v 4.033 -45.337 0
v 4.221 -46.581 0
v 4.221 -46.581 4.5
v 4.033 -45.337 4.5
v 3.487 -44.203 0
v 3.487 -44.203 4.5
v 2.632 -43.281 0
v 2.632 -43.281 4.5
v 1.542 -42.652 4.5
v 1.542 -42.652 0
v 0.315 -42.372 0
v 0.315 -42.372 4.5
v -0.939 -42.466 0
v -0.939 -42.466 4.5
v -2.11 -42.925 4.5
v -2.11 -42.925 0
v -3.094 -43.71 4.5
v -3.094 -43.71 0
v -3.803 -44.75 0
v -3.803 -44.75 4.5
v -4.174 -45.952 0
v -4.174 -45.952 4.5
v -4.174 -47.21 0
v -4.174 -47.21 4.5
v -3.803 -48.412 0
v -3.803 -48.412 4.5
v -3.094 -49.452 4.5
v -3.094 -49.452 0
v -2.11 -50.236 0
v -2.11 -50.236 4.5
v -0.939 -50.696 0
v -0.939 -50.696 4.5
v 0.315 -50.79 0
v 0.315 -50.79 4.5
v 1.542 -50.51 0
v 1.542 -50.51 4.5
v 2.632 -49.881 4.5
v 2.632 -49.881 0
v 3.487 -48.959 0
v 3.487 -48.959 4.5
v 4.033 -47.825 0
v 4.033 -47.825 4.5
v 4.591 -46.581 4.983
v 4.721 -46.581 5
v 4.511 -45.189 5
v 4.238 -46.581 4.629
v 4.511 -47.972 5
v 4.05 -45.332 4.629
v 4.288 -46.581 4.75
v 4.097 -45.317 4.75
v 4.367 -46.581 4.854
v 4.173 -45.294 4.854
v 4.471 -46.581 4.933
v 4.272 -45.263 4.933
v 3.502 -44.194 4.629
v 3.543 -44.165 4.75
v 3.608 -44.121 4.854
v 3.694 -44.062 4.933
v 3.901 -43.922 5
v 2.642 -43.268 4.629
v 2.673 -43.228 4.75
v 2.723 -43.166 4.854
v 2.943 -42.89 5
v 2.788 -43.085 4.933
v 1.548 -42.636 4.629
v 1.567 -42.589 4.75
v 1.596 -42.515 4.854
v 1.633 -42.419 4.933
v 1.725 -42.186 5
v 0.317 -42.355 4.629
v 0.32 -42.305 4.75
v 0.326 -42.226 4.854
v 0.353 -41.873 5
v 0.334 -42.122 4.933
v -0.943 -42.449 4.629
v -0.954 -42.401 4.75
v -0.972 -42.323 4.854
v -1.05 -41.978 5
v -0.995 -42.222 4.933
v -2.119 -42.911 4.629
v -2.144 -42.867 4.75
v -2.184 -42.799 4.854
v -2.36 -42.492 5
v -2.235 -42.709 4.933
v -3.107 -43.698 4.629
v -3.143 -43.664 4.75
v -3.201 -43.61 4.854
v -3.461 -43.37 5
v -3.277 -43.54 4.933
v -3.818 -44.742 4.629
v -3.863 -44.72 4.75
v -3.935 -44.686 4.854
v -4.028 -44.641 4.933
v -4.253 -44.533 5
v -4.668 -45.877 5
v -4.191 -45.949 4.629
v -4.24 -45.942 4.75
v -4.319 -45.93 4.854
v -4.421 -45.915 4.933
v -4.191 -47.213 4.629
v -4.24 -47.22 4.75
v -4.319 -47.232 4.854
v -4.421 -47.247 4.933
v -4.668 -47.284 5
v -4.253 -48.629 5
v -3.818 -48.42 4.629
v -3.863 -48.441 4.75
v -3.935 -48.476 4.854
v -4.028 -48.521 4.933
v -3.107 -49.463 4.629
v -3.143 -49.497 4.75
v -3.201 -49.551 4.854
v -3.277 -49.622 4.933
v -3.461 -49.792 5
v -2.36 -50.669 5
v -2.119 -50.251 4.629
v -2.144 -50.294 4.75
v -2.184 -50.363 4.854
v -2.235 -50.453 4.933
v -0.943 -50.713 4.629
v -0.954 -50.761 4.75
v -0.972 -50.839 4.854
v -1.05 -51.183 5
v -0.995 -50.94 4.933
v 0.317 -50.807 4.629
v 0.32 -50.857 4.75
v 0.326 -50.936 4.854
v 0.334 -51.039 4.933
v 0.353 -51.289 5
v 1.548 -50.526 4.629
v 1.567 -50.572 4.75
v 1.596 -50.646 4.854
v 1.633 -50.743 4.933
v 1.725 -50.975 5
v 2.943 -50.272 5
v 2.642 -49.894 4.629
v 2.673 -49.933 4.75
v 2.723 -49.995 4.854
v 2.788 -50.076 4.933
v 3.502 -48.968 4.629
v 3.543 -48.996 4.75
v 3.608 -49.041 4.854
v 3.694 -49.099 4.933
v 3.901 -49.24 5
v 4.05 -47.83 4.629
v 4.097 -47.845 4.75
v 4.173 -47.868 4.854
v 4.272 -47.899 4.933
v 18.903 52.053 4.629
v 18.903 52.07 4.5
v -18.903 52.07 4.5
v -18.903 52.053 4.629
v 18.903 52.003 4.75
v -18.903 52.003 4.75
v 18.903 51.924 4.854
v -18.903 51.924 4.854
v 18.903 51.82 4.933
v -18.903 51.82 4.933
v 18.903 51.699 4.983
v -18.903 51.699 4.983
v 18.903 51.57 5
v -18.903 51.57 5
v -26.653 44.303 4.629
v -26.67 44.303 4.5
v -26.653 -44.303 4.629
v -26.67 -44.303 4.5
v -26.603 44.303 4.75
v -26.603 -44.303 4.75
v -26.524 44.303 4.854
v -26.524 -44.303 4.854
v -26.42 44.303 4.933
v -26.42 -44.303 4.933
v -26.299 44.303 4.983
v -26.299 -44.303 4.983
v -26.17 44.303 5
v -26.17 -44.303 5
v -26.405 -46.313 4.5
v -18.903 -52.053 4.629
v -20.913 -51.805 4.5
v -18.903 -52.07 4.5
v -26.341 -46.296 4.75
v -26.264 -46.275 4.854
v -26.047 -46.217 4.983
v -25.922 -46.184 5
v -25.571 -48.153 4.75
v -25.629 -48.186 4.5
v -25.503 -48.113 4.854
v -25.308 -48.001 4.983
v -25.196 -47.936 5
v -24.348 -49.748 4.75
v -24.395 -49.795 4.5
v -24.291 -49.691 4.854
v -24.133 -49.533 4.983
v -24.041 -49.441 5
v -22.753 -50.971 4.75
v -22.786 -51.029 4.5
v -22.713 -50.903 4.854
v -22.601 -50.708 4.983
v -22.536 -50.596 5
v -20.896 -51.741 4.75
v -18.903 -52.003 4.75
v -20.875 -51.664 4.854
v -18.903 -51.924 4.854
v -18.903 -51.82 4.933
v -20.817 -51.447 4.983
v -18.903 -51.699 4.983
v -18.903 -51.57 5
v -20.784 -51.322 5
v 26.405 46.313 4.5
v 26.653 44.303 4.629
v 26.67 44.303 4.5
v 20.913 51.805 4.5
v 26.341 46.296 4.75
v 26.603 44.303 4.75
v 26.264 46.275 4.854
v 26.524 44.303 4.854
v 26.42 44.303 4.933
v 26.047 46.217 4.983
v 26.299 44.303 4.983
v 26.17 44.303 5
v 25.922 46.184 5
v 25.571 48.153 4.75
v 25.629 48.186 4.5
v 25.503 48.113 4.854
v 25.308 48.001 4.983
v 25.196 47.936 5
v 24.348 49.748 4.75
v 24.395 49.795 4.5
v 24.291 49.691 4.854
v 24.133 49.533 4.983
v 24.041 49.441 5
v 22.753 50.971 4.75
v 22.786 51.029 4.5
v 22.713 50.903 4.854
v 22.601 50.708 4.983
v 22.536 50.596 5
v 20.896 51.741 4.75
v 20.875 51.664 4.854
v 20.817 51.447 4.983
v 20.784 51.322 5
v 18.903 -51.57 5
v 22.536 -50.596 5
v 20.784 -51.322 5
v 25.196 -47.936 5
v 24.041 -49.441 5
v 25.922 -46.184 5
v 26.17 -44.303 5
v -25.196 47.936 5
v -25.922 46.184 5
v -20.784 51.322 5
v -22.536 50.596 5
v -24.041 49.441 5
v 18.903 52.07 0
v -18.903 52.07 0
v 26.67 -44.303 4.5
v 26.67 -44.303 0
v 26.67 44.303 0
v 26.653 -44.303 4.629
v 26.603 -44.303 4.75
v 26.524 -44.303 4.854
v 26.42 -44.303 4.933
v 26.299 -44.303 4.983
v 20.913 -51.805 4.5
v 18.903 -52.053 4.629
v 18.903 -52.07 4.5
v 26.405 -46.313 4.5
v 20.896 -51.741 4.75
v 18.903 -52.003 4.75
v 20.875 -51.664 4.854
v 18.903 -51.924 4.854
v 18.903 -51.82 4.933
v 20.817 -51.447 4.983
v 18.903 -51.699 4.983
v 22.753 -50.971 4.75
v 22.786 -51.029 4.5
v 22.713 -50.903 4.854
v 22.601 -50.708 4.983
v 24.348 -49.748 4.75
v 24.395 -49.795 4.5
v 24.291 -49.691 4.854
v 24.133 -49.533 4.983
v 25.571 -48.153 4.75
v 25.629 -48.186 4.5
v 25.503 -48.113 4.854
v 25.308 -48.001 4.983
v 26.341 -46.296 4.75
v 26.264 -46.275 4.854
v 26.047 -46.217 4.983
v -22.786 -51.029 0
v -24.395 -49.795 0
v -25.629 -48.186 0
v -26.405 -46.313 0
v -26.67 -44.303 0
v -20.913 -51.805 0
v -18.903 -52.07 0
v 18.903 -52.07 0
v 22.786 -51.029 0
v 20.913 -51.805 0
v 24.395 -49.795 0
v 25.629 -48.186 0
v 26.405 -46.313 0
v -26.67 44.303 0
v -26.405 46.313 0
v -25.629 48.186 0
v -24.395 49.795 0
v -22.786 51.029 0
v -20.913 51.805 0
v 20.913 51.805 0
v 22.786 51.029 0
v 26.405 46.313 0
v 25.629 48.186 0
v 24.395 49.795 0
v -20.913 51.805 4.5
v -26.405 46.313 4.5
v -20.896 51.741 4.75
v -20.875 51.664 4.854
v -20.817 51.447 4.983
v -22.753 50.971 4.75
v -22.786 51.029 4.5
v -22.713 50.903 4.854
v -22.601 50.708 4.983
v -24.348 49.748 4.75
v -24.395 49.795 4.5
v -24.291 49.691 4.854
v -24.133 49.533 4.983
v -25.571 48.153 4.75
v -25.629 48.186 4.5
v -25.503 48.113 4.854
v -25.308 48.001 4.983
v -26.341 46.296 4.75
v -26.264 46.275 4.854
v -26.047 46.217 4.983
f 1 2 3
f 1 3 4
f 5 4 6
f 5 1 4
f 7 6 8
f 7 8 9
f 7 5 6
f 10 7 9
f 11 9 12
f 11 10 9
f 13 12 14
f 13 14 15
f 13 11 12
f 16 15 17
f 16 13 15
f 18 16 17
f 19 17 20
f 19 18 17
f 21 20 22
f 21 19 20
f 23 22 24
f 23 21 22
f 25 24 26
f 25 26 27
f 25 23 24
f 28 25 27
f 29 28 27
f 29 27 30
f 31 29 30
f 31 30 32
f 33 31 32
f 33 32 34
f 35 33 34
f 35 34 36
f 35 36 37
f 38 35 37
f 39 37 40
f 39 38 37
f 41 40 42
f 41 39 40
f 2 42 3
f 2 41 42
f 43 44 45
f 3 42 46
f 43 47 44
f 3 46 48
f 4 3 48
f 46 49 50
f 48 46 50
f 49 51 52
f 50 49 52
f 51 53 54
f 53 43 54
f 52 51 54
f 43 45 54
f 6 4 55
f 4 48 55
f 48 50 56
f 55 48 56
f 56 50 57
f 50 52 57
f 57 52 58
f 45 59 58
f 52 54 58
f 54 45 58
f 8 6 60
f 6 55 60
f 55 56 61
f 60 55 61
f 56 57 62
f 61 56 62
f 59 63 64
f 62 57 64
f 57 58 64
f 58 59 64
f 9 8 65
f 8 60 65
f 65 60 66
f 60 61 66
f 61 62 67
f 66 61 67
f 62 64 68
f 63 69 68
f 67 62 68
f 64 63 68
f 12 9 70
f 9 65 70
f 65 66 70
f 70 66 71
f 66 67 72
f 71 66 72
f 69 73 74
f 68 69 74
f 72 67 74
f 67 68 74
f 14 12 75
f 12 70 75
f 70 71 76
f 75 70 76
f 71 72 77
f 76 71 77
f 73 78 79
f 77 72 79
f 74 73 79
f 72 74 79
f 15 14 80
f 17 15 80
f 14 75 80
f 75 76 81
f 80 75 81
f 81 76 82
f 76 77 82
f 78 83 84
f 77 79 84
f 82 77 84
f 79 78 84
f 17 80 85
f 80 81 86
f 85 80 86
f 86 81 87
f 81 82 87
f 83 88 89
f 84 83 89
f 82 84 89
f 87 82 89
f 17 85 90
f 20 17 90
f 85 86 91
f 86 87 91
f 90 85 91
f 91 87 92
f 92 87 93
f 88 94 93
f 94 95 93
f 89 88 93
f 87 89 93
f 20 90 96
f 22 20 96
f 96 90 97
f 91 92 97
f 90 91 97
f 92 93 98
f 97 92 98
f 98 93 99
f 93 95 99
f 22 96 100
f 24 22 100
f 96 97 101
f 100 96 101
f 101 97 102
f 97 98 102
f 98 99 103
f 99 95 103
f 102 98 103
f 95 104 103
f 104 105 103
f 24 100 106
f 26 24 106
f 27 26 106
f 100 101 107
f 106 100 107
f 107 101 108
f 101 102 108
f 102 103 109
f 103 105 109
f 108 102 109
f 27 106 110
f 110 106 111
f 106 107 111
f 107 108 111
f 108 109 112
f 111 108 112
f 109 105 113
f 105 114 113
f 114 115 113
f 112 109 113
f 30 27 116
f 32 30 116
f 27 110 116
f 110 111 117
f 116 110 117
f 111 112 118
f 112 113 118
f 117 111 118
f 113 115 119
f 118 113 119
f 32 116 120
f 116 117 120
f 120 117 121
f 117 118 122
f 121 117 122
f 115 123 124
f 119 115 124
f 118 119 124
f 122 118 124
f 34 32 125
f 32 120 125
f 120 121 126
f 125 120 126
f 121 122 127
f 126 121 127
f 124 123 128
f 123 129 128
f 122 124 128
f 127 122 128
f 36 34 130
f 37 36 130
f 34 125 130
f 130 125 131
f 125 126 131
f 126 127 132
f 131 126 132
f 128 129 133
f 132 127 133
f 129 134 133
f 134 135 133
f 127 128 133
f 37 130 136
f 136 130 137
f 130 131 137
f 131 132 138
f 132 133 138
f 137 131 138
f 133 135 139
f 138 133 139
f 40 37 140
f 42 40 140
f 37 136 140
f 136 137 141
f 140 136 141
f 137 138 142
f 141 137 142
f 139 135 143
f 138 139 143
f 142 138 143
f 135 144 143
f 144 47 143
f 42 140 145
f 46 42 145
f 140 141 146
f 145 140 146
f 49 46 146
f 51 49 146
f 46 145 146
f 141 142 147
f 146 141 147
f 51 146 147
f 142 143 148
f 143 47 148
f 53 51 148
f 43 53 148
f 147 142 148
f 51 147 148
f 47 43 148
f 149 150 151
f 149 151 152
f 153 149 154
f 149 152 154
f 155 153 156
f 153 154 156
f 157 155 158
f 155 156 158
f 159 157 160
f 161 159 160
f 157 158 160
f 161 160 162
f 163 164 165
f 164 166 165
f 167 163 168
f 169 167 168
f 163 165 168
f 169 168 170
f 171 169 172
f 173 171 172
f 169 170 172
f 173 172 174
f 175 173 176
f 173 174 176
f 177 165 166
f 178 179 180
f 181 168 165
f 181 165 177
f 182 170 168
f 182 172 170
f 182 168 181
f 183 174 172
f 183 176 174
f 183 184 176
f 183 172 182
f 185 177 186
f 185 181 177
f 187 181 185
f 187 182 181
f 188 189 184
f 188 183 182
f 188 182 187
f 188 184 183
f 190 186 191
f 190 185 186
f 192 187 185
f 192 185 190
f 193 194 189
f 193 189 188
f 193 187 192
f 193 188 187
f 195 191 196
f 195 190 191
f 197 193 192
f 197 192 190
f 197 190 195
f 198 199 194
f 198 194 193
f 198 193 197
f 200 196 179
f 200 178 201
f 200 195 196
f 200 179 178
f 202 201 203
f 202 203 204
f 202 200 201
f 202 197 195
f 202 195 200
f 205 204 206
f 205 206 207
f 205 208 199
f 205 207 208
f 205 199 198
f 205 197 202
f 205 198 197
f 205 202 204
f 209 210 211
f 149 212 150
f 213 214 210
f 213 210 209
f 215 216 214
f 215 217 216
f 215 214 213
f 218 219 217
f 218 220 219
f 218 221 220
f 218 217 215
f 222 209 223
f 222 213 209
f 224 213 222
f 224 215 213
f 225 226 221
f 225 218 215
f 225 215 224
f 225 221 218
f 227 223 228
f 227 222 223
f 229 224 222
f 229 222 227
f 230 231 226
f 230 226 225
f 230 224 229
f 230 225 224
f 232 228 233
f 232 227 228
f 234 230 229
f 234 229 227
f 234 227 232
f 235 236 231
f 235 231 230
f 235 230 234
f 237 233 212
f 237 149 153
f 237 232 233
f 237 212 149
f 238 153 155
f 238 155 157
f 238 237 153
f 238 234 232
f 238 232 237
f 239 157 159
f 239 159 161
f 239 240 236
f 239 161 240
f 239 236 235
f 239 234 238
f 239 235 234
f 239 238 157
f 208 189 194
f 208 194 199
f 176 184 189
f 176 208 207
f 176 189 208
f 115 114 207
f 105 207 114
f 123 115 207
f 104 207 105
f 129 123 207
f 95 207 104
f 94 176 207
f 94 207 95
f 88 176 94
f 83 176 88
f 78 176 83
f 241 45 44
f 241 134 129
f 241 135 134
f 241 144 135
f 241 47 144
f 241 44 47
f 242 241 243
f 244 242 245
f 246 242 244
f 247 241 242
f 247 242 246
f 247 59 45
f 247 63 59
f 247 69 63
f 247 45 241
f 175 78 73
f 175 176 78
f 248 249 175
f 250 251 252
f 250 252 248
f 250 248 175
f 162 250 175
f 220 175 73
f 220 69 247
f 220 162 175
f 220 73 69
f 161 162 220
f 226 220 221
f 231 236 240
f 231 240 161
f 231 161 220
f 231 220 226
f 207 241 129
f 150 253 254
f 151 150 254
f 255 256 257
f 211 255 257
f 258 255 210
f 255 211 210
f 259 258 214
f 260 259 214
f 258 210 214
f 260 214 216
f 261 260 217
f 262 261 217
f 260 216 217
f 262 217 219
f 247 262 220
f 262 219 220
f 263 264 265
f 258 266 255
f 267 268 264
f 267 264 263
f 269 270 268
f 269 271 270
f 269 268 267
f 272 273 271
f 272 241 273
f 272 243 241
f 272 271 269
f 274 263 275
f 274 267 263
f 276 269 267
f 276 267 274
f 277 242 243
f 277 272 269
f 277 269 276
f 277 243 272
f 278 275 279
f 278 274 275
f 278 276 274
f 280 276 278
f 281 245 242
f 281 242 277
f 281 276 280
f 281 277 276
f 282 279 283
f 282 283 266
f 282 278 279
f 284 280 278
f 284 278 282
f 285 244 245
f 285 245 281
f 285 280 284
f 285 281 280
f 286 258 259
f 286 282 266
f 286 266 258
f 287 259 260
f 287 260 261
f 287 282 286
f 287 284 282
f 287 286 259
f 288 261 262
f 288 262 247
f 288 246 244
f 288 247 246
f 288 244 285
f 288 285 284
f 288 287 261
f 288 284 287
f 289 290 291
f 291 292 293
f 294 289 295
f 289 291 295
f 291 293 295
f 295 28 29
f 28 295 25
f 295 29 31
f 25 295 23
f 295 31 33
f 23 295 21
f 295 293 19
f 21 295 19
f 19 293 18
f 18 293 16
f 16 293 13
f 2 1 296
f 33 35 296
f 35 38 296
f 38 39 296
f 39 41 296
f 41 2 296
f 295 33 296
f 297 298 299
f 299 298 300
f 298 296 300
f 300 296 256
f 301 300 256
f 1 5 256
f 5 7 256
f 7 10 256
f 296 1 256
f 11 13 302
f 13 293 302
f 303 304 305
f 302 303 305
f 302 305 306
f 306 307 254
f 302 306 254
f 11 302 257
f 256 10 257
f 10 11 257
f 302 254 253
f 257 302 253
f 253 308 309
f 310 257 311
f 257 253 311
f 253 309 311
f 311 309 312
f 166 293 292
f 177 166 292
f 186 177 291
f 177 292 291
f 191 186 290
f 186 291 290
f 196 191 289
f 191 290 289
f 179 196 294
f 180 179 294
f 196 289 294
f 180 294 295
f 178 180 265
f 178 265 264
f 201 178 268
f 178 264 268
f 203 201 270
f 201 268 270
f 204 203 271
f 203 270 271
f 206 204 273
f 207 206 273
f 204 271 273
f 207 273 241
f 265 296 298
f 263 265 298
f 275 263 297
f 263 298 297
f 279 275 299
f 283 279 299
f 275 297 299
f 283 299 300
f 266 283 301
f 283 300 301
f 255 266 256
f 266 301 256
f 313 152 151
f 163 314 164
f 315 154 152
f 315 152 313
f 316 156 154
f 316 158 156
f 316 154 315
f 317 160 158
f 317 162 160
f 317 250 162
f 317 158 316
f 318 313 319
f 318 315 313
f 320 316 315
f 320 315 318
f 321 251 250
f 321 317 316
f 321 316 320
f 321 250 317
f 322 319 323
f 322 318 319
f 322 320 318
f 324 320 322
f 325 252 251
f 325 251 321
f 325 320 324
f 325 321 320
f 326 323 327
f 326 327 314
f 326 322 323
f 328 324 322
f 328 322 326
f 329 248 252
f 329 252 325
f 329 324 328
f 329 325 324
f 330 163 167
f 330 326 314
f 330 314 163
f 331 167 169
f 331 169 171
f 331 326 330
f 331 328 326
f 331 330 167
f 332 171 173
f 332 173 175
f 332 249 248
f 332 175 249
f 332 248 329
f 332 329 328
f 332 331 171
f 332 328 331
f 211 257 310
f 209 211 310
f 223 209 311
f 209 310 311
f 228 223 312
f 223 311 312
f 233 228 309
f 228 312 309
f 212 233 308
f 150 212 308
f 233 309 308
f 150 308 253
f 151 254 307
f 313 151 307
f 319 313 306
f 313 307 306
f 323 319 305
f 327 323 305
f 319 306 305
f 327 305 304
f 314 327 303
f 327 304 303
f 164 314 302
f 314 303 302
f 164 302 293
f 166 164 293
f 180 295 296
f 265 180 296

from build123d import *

# Parameters (mm, degrees)
F0_R     = 4.220901
F1_DEPTH = 5
F2_R     = 0.5


with BuildPart() as f1:
    # F0 (on Top) → F1 (new body)
    with BuildSketch(Plane.XY):
        with BuildLine():
            ThreePointArc((26.67, 44.302669), (24.395001, 49.795001), (18.902669, 52.07))
            Line((18.902669, 52.07), (-18.902669, 52.07))
            ThreePointArc((-18.902669, 52.07), (-24.395001, 49.795001), (-26.67, 44.302669))
            Line((-26.67, 44.302669), (-26.67, -44.302669))
            ThreePointArc((-26.67, -44.302669), (-24.395001, -49.795001), (-18.902669, -52.07))
            Line((-18.902669, -52.07), (18.902669, -52.07))
            ThreePointArc((18.902669, -52.07), (24.395001, -49.795001), (26.67, -44.302669))
            Line((26.67, -44.302669), (26.67, 44.302669))
        make_face()
        with Locations((0, -46.580885)):
            Circle(F0_R, mode=Mode.SUBTRACT)
    extrude(amount=F1_DEPTH)

    # F2
    f2_edges = [f1.edges().sort_by_distance(p)[0] for p in [
        (26.67, 0, 5),
        (24.395001, 49.795001, 5),
        (0, 52.07, 5),
        (-24.395001, 49.795001, 5),
        (-26.67, 0, 5),
        (-24.395001, -49.795001, 5),
        (0, -52.07, 5),
        (24.395001, -49.795001, 5),
        (-4.220901, -46.580885, 5),
    ]]
    fillet(f2_edges, radius=F2_R)


solid = f1.part
